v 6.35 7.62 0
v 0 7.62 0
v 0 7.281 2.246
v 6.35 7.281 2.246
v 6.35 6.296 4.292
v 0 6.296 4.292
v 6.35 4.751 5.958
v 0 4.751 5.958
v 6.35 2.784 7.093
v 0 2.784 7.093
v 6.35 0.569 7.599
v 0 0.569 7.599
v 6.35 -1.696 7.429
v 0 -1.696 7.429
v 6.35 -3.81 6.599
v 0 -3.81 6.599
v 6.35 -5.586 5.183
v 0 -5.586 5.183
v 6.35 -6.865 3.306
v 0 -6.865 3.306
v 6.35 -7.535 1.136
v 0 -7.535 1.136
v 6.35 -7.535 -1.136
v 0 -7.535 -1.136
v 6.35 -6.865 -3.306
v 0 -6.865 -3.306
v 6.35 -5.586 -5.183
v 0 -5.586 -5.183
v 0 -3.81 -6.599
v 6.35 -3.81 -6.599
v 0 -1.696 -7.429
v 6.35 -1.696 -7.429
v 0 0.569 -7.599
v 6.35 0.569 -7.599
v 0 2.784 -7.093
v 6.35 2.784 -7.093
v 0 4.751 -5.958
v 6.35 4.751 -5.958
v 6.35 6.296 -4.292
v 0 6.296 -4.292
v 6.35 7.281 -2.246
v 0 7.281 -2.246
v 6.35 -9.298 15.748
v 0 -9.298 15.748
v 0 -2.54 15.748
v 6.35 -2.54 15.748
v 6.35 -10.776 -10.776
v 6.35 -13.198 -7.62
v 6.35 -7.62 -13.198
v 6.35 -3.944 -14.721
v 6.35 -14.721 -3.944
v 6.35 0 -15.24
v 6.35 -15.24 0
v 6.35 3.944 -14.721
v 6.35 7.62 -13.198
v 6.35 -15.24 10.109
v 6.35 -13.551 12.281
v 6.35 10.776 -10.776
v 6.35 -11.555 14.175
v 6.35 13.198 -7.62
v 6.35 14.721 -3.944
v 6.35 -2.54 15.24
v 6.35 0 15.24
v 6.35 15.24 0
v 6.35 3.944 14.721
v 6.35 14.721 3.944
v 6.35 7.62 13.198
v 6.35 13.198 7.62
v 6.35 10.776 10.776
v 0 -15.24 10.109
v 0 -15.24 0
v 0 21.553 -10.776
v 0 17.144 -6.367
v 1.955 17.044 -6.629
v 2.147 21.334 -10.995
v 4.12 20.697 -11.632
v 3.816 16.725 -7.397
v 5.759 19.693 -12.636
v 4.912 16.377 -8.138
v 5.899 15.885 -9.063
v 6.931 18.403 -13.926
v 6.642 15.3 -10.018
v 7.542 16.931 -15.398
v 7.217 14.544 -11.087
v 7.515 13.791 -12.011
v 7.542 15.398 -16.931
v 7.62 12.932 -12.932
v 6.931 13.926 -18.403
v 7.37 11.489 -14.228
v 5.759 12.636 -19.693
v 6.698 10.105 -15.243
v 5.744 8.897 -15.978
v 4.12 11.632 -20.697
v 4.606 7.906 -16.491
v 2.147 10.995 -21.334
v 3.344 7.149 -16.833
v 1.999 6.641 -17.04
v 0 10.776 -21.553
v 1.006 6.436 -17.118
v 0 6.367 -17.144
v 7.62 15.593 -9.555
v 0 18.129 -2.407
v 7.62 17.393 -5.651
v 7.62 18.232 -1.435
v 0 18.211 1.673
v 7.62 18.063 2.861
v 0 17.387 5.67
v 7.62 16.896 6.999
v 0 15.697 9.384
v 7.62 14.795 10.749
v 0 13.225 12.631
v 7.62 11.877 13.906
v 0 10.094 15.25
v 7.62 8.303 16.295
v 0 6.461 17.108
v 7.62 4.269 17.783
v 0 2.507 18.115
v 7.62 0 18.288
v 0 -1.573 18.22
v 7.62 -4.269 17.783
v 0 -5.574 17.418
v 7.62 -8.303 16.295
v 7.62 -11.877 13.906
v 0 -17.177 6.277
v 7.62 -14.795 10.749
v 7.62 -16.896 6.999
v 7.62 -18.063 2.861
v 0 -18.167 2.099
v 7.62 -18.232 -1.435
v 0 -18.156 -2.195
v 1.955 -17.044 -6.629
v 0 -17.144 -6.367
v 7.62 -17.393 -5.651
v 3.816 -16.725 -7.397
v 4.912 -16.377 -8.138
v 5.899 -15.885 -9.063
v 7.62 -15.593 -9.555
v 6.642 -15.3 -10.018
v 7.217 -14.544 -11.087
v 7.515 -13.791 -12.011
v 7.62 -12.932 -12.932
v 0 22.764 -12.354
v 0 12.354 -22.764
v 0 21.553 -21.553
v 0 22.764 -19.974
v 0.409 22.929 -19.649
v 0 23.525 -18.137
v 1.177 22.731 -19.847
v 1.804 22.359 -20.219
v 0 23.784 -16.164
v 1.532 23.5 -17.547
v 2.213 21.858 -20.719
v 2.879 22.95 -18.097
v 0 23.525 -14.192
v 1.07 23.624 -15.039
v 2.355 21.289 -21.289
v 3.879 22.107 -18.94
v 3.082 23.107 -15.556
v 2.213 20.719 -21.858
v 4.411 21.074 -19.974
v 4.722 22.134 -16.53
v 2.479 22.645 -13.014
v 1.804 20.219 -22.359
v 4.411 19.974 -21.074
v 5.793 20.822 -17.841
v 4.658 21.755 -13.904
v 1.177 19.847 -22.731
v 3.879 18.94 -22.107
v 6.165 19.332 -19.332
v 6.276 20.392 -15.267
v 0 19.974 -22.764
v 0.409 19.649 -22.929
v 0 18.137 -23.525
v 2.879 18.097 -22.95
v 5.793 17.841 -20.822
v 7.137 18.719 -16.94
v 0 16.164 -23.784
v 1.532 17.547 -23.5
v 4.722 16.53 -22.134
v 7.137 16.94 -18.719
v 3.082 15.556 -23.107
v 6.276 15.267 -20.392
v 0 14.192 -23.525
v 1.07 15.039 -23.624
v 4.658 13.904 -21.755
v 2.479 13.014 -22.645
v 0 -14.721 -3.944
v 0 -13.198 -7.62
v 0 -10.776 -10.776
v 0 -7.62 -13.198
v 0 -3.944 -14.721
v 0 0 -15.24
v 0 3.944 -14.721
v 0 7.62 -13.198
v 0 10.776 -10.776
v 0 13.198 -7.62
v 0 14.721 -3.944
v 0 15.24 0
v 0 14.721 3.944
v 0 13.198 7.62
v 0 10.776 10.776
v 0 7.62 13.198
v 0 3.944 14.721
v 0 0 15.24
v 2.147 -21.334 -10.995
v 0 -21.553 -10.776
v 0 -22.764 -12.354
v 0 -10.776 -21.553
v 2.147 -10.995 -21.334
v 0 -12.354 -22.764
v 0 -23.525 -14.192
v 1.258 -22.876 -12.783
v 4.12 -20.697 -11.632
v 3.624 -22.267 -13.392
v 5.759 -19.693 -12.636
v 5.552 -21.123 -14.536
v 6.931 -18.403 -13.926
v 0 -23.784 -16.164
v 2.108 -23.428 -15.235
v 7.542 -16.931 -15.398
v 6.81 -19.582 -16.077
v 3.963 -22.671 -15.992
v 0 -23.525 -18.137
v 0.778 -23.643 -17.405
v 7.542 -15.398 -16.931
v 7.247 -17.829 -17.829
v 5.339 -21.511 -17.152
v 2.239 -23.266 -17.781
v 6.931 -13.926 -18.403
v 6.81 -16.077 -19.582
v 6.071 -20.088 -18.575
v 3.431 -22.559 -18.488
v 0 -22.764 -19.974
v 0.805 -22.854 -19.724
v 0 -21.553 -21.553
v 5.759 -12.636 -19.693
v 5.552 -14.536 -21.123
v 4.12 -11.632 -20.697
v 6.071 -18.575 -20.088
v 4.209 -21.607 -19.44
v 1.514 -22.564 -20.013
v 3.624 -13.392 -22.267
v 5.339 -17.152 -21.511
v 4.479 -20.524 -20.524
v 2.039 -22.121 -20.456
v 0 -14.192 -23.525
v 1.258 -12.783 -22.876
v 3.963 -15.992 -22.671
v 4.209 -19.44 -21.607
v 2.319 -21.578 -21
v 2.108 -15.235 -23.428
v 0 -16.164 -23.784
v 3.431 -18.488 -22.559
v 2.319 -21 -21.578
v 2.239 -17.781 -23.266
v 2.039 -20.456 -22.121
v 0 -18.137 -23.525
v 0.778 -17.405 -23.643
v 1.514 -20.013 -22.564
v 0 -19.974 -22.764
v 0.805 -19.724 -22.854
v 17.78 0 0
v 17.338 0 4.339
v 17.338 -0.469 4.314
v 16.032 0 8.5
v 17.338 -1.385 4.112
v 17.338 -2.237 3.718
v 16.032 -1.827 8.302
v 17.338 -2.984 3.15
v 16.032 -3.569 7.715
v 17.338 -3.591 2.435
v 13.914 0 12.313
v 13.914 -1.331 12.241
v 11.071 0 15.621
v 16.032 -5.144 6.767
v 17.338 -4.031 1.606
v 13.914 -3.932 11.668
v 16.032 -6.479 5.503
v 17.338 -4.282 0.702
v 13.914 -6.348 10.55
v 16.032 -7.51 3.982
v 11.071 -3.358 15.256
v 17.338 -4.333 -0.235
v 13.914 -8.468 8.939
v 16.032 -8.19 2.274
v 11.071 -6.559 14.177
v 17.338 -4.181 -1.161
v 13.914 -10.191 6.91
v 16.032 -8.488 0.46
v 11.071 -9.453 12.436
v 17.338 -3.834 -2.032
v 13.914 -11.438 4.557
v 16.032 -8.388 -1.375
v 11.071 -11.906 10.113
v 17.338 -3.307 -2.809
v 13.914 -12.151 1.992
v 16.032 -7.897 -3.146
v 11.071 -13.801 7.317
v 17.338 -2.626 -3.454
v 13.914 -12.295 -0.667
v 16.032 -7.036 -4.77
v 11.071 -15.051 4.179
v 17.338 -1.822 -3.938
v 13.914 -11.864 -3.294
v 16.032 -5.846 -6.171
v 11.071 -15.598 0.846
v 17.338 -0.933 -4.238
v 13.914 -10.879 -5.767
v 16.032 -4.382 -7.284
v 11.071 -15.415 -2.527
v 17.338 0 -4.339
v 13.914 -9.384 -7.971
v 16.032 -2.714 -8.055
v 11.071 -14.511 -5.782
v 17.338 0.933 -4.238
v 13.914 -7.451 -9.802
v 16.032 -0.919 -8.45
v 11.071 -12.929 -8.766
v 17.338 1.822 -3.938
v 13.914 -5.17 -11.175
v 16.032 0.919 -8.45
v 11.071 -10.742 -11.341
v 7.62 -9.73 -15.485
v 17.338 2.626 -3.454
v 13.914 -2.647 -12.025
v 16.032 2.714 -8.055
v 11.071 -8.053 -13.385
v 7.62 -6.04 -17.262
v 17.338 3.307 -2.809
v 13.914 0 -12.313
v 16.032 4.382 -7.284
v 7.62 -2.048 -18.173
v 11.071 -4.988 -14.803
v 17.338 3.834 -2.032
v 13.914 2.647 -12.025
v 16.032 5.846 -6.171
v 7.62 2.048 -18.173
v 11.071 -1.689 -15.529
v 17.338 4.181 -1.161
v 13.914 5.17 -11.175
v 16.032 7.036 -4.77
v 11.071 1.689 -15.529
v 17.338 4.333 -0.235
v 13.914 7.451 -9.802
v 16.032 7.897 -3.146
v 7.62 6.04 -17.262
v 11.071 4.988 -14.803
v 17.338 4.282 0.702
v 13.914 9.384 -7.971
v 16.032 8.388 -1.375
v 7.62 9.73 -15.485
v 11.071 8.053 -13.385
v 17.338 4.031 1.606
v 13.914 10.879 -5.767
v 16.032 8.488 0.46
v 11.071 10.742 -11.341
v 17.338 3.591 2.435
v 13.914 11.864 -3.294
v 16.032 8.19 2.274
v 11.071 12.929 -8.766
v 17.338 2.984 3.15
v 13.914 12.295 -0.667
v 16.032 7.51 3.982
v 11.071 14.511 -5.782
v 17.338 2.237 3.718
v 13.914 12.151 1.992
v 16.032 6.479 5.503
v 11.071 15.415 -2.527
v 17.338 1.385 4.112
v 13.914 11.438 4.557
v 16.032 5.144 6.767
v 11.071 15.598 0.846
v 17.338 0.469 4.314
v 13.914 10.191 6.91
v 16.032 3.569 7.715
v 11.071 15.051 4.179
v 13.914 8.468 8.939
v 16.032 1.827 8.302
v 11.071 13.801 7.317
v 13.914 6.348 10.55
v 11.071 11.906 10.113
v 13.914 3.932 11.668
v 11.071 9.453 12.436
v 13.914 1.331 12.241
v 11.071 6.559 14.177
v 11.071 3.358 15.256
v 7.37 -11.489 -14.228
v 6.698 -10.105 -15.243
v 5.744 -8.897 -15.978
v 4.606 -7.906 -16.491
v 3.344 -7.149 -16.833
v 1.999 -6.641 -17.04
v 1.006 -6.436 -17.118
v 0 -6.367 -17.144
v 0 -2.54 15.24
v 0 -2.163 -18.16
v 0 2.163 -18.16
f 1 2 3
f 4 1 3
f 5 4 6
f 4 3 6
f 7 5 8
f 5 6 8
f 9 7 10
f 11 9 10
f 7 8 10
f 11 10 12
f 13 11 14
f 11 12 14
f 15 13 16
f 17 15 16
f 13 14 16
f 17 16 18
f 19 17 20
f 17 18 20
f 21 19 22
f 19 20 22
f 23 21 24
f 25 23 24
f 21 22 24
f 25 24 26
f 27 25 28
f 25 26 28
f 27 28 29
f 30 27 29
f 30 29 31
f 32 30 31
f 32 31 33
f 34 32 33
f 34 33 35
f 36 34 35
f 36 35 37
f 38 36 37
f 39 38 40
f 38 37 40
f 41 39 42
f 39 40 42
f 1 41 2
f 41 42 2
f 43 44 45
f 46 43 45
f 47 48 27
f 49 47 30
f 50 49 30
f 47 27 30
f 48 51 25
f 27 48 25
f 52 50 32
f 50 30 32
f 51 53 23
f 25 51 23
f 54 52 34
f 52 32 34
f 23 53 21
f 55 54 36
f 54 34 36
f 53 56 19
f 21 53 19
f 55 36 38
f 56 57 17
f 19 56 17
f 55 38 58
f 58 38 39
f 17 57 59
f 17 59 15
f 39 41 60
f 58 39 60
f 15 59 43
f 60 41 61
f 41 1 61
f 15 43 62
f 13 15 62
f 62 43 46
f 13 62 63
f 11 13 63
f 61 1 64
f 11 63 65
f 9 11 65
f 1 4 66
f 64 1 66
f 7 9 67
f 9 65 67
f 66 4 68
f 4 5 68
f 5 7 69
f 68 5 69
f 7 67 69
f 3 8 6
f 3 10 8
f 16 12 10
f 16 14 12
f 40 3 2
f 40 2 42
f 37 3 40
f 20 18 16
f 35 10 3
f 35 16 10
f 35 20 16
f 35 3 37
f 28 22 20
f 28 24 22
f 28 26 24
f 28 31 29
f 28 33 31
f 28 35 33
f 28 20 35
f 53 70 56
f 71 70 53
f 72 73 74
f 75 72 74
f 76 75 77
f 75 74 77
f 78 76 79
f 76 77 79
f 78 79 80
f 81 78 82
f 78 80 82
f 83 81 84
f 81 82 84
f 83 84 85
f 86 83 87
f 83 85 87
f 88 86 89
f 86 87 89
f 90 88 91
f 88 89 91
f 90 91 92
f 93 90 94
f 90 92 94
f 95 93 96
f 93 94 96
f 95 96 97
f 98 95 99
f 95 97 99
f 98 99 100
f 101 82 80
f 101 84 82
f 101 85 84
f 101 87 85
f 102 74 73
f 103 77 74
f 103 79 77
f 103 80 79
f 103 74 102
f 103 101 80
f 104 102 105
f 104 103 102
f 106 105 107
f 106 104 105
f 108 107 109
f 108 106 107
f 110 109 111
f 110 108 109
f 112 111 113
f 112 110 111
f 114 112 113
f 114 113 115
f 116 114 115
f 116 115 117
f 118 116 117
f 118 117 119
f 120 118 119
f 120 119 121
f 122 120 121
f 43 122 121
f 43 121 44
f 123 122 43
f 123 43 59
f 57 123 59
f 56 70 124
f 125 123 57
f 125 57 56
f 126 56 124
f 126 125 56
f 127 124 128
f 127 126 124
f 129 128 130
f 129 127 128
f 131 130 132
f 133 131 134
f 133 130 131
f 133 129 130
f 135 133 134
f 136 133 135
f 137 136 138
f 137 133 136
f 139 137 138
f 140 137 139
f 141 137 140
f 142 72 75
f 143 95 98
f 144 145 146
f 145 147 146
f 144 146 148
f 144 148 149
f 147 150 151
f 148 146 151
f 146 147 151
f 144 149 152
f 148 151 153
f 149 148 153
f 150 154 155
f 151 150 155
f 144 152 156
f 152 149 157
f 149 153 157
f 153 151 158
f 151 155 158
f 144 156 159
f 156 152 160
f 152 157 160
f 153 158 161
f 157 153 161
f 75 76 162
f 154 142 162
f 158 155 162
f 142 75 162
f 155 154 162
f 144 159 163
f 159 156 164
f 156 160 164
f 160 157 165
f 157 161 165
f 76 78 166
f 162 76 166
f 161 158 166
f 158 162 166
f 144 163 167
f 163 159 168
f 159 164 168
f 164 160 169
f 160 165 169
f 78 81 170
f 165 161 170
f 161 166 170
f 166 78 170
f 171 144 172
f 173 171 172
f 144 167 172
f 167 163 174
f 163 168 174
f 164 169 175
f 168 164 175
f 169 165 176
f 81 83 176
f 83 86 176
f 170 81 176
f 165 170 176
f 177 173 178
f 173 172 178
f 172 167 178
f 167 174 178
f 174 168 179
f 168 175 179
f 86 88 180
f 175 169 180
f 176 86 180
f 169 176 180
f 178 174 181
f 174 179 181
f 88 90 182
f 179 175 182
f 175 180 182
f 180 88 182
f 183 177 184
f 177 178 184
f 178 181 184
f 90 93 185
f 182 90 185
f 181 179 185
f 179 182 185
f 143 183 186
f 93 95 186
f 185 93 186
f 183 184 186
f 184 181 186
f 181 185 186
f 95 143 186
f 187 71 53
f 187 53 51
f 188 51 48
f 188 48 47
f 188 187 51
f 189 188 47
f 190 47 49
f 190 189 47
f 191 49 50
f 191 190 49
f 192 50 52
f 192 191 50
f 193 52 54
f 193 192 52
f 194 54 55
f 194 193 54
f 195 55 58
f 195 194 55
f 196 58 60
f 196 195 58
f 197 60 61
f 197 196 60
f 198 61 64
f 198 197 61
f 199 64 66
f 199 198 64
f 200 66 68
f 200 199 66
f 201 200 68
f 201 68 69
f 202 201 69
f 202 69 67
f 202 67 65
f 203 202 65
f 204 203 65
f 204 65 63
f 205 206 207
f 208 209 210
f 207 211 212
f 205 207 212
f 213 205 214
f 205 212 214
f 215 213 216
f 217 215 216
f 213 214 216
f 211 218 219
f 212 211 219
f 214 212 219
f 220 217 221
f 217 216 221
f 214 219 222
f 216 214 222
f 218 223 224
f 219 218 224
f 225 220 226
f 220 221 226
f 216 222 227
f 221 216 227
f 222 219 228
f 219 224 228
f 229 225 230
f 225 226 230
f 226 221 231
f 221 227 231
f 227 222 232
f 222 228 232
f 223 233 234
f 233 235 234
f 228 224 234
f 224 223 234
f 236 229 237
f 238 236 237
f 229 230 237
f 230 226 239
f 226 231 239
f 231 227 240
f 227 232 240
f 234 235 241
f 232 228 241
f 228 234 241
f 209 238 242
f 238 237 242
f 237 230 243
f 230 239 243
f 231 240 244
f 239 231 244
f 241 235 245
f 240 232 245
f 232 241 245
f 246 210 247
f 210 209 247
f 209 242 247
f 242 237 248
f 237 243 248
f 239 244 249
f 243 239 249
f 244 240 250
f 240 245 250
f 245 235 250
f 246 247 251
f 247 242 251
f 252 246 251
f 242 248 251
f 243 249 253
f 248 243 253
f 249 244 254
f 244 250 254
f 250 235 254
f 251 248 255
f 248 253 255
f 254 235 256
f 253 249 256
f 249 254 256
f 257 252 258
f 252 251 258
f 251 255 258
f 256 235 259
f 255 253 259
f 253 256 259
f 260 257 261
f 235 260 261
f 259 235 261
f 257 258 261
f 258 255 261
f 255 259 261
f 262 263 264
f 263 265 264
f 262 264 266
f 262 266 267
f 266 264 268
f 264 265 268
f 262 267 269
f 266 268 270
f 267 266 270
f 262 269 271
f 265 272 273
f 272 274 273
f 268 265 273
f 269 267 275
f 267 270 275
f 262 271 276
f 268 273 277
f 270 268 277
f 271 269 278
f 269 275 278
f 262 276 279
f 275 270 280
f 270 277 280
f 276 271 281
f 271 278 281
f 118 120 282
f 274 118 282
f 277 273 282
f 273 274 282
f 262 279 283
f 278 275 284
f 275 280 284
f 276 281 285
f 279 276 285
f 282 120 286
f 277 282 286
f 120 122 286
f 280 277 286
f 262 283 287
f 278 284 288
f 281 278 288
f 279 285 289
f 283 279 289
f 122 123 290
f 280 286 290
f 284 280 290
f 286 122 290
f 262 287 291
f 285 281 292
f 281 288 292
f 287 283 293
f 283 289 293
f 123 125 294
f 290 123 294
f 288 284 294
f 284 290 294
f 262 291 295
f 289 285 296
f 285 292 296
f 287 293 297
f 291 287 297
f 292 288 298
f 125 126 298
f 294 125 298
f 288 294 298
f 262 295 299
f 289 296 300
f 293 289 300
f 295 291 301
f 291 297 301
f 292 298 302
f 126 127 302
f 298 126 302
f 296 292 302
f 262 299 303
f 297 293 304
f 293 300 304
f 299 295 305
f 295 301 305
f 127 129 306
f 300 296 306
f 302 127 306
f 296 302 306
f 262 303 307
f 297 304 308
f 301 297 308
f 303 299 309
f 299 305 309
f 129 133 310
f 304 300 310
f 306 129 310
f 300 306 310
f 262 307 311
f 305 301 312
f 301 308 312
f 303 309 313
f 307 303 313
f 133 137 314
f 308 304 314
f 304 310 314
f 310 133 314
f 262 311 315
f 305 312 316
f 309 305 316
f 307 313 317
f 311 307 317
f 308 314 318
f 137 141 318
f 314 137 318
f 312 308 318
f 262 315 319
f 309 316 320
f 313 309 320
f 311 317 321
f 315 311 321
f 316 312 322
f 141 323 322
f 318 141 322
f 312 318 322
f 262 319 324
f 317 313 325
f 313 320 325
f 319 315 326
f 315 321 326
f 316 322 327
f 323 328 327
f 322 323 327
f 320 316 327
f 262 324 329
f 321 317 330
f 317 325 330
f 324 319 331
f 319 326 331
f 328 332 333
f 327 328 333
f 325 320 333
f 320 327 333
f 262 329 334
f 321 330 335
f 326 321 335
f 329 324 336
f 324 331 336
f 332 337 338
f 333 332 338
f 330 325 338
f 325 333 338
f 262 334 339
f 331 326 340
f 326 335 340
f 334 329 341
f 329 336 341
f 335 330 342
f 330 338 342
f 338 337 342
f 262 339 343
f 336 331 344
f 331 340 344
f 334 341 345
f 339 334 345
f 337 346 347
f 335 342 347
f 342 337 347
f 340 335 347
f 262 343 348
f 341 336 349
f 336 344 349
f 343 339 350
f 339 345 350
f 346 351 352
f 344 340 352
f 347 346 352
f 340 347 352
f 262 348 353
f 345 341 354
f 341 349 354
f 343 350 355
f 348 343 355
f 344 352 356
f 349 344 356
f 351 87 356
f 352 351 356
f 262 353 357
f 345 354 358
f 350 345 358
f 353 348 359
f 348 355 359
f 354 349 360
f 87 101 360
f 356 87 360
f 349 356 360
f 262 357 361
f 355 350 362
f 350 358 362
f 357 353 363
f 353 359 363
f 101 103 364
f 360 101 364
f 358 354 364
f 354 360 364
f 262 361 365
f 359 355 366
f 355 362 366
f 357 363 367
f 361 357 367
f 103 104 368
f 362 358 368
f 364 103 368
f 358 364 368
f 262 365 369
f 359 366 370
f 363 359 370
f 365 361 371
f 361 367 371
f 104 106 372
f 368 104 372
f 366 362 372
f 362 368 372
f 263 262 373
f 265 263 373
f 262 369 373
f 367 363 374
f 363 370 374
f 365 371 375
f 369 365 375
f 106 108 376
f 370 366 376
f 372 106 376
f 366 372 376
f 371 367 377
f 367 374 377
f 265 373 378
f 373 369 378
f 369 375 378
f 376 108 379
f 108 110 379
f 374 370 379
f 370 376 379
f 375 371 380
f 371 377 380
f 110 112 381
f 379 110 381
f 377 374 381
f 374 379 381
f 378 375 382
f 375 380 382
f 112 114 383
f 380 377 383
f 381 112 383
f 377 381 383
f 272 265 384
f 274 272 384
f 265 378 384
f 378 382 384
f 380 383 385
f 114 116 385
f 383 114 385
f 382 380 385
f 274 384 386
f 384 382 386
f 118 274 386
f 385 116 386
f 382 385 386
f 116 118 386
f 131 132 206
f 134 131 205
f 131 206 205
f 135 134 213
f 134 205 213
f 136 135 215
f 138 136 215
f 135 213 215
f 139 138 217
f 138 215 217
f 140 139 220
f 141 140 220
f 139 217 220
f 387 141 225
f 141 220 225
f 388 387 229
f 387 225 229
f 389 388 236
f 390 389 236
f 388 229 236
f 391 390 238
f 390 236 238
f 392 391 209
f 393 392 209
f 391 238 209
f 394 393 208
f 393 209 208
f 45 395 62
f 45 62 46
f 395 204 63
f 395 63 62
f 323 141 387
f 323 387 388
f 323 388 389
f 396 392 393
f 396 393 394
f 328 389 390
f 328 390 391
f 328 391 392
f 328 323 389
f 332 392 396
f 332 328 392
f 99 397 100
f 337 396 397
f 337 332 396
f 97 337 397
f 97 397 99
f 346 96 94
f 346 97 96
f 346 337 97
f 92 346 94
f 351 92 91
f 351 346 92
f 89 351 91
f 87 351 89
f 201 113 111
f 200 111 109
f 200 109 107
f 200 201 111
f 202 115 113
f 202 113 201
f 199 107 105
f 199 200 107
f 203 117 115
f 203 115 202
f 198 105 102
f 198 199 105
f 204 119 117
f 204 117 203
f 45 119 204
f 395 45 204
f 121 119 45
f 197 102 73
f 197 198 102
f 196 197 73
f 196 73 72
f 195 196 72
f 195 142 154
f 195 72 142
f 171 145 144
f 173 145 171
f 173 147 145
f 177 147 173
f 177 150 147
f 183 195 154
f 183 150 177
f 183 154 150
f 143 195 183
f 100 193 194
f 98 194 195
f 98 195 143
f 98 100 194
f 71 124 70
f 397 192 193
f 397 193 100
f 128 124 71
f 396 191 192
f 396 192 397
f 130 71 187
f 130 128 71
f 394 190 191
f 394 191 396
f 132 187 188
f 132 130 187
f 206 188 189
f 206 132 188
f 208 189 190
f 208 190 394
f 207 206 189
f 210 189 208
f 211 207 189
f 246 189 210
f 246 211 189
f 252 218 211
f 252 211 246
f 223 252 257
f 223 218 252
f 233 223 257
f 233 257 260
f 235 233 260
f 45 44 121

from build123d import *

# Parameters (mm, degrees)
F1_W     = 7.62
F1_H     = 18.288
F4_ANGLE = 180
F5_ANGLE = 180
F0_R     = 7.62
F0_W     = 12.7
F0_H     = 0.508
F6_DEPTH = 6.35


with BuildPart() as f2:
    # F1 (on Front) → F2 (revolve)
    with BuildSketch(Plane.XZ):
        with Locations((3.81, 9.144)):
            Rectangle(F1_W, F1_H)
        with BuildLine():
            ThreePointArc((17.78, 0), (15.0694484018, 10.4603602232), (7.62, 18.288))
            Line((7.62, 18.288), (7.62, 0))
            Line((7.62, 0), (17.78, 0))
        make_face()
    revolve(axis=Axis((3.81, 0, 0), (1, 0, 0)))

    # F3 (on Right) → F4 (revolve)
    with BuildSketch(Plane.YZ):
        Polygon((-16.1644610179, -16.1644610179), (-7.1842048969, -7.1842048969), (-12.5723585695, -1.7960512242), (-21.5526146906, -10.7763073453), align=None)
        with BuildLine():
            Line((-21.5526146906, -21.5526146906), (-16.1644610179, -16.1644610179))
            Line((-16.1644610179, -16.1644610179), (-21.5526146906, -10.7763073453))
            ThreePointArc((-21.5526146906, -10.7763073453), (-23.7844610179, -16.1644610179), (-21.5526146906, -21.5526146906))
        make_face()
    revolve(axis=Axis((0, -8.082230509, -8.082230509), (0, 0.7071067812, 0.7071067812)), revolution_arc=F4_ANGLE)

    # F3 (on Right) → F5 (revolve)
    with BuildSketch(Plane.YZ):
        Polygon((12.5723585695, -1.7960512242), (7.1842048969, -7.1842048969), (16.1644610179, -16.1644610179), (21.5526146906, -10.7763073453), align=None)
        with BuildLine():
            Line((21.5526146906, -10.7763073453), (16.1644610179, -16.1644610179))
            Line((16.1644610179, -16.1644610179), (21.5526146906, -21.5526146906))
            ThreePointArc((21.5526146906, -21.5526146906), (23.7844610179, -16.1644610179), (21.5526146906, -10.7763073453))
        make_face()
    revolve(axis=Axis((0, 8.082230509, -8.082230509), (0, 0.7071067812, -0.7071067812)), revolution_arc=F5_ANGLE)

    # F0 (on Right) → F6 (cut)
    with BuildSketch(Plane.YZ):
        with BuildLine():
            Line((-15.24, 15.24), (-25.4, 15.24))
            Line((-25.4, 15.24), (-25.4, 10.16))
            Line((-25.4, 10.16), (-15.24, 10.16))
            Line((-15.24, 10.16), (-15.24, 0))
            ThreePointArc((-15.24, 0), (10.7763073453, -10.7763073453), (0, 15.24))
            Line((0, 15.24), (-2.54, 15.24))
            Line((-2.54, 15.24), (-15.24, 15.24))
        make_face()
        Circle(F0_R, mode=Mode.SUBTRACT)
        with Locations((-8.89, 15.494)):
            Rectangle(F0_W, F0_H)
    extrude(amount=F6_DEPTH, mode=Mode.SUBTRACT)


solid = f2.part
